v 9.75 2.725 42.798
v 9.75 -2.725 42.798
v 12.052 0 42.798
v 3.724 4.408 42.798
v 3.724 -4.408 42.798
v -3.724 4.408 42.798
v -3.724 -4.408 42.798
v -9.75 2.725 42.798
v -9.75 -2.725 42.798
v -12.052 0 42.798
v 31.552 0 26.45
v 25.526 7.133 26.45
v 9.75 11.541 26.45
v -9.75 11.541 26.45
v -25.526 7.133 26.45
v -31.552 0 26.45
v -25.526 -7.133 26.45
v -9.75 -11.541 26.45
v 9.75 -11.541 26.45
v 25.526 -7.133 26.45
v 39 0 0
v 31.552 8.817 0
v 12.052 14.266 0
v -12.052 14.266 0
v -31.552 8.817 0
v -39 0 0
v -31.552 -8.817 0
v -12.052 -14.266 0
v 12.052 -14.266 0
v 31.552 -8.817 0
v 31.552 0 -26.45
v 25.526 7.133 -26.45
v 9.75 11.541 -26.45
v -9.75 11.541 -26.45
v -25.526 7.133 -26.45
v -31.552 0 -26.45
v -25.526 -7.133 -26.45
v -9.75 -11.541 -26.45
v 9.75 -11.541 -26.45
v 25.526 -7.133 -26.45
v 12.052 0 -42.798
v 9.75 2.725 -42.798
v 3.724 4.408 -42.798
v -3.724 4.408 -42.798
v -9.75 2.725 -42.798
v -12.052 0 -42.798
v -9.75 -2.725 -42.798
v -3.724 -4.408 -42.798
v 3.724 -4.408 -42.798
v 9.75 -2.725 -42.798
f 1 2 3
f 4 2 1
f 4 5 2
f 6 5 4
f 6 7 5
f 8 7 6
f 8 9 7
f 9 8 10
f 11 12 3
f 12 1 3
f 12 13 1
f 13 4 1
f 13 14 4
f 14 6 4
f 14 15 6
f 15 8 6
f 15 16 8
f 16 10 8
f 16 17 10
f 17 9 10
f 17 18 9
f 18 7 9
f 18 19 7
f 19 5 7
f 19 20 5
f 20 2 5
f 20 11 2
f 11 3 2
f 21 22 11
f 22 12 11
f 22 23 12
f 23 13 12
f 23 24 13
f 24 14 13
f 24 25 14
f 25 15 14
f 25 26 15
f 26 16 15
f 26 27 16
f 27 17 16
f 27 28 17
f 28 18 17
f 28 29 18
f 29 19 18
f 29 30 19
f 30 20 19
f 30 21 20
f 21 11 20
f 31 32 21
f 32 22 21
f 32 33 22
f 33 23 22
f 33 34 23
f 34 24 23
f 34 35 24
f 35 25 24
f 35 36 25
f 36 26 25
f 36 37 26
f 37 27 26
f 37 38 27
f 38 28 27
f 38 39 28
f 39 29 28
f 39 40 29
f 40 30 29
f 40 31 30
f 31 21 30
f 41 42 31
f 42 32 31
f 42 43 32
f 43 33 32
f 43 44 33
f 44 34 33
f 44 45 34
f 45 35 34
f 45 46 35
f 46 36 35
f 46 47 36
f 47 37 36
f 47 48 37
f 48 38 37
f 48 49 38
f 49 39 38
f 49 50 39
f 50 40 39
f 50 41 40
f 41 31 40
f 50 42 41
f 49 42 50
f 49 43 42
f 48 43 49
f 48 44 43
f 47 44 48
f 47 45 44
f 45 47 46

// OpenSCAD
// Generated by SolidPython 1.0.1 on 2020-07-29 00:46:50


scale(v = [13, 5, 15]) {
	sphere(r = 3);
}
/***********************************************
*********      SolidPython code:      **********
************************************************
 
# import packages: SolidPython
from solid import *
from solid.utils import *
from itertools import chain, combinations, permutations


class Resize:

    def __init__(self, scad_file):
        self.scad_file = scad_file
        #self.scad_file = import_scad(scad_file)
        # cone/cylinder param:
        self.r1 = 0
        self.r2 = 0
        self.h = 0
        # rectangular prism param:
        self.w = 0
        self.l = 0
        # ellipse param:
        self.r = 0

    # import OpenScad code (file name corresponds to shape)


    # classify shape + parameters
    def assign(self, param1, param2, param3):
        if self.scad_file == 'cone.scad':
            self.r1 = param1
            self.r2 = param2
            self.h = param3
        elif self.scad_file == 'cylinder.scad':
            self.r1 = param1
            self.r2 = param2
            self.h = param3
        elif self.scad_file == 'rectangularPrism.scad':
            self.h = param1
            self.l = param2
            self.w = param3
        else:
            self.r = param1
            self.h = param2

    # resize parameters
    def iterate(self):
        x = range(3, 20, 2)
        i = 1
        if self.scad_file == 'cone.scad':
            tempList = list(permutations(x, 2))
            for temp in tempList:
                param1 = temp[0]
                param2 = temp[1]
                filepath = 'produced_scad_files/' + 'cone' + str(param1) + '_' + str(param2) + '_' + '.scad'
                scad_render_to_file(cylinder(h=param1, r1=param2, r2=0), filepath)

        elif self.scad_file == 'cylinder.scad':
            tempList = list(permutations(x, 3))
            for temp in tempList:
                param1 = temp[0]
                param2 = temp[1]
                filepath = 'produced_scad_files/' + 'cylinder' + str(param1) + '_' + str(param2) + '_' + '.scad'
                scad_render_to_file(cylinder(h=param1, r1=param2, r2=param2), filepath)

        elif self.scad_file == 'rectangularPrism.scad':
            tempList = list(permutations(x, 3))
            for temp in tempList:
                param1 = temp[0]
                param2 = temp[1]
                param3 = temp[2]
                filepath = 'produced_scad_files/' + 'rectangularPrism' + str(param1) + '_' + str(param2) + '_' + str(
                    param3) + '.scad'
                scad_render_to_file(cube(size=(param1, param2, param3)), filepath)

        elif self.scad_file == 'ellipse.scad':
            tempList = list(permutations(x, 4))
            for temp in tempList:
                param1 = temp[0]
                param2 = temp[1]
                param3 = temp[2]
                param4 = temp[3]
                filepath = 'produced_scad_files/' + 'ellipse' + str(param1) + '_' + str(param2) + '_' + str(param3) + '_' + str(param4) + '.scad'
                scad_render_to_file(scale([param1, param2, param3])(sphere(r=param4)), filepath)

    def render_to_scadfile(self):
        scad_render_to_file(scad, 'example.scad') 
 
************************************************/
